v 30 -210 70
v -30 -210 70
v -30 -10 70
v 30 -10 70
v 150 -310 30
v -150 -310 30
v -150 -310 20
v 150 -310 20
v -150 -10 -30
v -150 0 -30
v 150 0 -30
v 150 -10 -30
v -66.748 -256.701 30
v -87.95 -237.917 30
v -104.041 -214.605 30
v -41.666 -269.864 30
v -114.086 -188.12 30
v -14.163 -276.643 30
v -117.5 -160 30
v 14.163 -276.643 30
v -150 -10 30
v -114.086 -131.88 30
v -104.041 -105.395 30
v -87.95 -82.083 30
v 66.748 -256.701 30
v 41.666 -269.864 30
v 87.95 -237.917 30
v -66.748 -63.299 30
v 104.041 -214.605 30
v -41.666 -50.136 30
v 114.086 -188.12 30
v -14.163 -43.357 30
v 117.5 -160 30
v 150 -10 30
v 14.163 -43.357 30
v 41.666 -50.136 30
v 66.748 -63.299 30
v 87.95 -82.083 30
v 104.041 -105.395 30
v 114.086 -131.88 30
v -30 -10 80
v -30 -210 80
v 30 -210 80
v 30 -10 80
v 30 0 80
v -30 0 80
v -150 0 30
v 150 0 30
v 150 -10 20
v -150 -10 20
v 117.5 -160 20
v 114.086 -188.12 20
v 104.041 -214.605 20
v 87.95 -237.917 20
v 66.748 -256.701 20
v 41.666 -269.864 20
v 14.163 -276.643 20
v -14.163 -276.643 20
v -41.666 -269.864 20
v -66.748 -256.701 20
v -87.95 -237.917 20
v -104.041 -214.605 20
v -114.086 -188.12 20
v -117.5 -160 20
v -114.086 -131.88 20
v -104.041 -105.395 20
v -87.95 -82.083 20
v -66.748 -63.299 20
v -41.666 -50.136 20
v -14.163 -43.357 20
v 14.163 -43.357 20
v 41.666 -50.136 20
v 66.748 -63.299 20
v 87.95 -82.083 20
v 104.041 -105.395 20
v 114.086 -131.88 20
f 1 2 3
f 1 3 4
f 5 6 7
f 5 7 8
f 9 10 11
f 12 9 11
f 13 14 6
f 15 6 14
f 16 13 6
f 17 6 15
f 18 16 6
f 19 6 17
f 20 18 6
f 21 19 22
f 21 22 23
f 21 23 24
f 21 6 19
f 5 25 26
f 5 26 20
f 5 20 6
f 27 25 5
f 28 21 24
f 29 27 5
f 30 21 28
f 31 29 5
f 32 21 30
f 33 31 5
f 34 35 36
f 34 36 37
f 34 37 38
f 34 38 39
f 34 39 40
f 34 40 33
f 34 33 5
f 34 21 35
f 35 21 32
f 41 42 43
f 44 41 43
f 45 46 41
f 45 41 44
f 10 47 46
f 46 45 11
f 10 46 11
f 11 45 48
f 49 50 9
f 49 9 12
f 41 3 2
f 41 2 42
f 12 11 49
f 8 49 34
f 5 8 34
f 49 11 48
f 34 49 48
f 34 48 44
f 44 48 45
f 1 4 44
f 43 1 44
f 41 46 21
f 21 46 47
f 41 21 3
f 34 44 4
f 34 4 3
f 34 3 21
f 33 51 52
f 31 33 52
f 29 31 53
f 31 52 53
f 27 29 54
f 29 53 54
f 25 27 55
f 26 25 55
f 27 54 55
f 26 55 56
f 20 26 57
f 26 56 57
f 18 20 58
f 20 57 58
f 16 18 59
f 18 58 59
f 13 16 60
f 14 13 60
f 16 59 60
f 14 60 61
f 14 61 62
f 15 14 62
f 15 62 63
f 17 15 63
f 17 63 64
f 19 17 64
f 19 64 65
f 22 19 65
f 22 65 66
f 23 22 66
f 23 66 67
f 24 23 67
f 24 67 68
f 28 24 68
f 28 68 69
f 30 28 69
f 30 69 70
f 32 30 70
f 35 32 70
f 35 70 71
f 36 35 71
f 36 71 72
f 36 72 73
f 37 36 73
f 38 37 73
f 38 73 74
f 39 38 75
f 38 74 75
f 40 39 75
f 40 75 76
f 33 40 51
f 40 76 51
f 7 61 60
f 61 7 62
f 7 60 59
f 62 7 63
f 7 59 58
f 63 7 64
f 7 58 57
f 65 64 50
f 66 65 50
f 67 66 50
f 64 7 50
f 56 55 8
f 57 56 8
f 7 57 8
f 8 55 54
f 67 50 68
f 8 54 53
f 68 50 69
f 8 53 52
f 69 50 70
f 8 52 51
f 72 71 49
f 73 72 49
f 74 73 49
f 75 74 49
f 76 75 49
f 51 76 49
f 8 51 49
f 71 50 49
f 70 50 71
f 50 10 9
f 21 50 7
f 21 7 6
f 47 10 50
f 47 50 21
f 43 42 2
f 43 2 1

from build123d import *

# Parameters (mm, degrees)
F0_W     = 300
F0_H     = 60
F1_DEPTH = 10
F2_W     = 300
F2_H     = 10
F3_DEPTH = 300
F4_R     = 117.5
F5_DEPTH = 60.001
F6_W     = 60
F6_H     = 10
F7_DEPTH = 200


with BuildPart() as f1:
    # F0 (on Front) → F1 (new body)
    with BuildSketch(Plane.XZ):
        Rectangle(F0_W, F0_H)
        Polygon((-150, 30), (150, 30), (30, 80), (0, 80), (-30, 80), align=None)
    extrude(amount=F1_DEPTH)

    # F2 (on face) → F3 (join)
    with BuildSketch(Plane.XZ.offset(10)):
        with Locations((0, 25)):
            Rectangle(F2_W, F2_H)
    extrude(amount=F3_DEPTH)

    # F4 (on face) → F5 (cut, through all)
    with BuildSketch(Plane(origin=(0, 0, 20), x_dir=(1, 0, 0), z_dir=(0, 0, -1))):
        with Locations((0, 160)):
            Circle(F4_R)
    extrude(amount=-F5_DEPTH, mode=Mode.SUBTRACT)

    # F6 (on face) → F7 (join)
    with BuildSketch(Plane.XZ.offset(10)):
        with Locations((0, 75)):
            Rectangle(F6_W, F6_H)
    extrude(amount=F7_DEPTH)


solid = f1.part
